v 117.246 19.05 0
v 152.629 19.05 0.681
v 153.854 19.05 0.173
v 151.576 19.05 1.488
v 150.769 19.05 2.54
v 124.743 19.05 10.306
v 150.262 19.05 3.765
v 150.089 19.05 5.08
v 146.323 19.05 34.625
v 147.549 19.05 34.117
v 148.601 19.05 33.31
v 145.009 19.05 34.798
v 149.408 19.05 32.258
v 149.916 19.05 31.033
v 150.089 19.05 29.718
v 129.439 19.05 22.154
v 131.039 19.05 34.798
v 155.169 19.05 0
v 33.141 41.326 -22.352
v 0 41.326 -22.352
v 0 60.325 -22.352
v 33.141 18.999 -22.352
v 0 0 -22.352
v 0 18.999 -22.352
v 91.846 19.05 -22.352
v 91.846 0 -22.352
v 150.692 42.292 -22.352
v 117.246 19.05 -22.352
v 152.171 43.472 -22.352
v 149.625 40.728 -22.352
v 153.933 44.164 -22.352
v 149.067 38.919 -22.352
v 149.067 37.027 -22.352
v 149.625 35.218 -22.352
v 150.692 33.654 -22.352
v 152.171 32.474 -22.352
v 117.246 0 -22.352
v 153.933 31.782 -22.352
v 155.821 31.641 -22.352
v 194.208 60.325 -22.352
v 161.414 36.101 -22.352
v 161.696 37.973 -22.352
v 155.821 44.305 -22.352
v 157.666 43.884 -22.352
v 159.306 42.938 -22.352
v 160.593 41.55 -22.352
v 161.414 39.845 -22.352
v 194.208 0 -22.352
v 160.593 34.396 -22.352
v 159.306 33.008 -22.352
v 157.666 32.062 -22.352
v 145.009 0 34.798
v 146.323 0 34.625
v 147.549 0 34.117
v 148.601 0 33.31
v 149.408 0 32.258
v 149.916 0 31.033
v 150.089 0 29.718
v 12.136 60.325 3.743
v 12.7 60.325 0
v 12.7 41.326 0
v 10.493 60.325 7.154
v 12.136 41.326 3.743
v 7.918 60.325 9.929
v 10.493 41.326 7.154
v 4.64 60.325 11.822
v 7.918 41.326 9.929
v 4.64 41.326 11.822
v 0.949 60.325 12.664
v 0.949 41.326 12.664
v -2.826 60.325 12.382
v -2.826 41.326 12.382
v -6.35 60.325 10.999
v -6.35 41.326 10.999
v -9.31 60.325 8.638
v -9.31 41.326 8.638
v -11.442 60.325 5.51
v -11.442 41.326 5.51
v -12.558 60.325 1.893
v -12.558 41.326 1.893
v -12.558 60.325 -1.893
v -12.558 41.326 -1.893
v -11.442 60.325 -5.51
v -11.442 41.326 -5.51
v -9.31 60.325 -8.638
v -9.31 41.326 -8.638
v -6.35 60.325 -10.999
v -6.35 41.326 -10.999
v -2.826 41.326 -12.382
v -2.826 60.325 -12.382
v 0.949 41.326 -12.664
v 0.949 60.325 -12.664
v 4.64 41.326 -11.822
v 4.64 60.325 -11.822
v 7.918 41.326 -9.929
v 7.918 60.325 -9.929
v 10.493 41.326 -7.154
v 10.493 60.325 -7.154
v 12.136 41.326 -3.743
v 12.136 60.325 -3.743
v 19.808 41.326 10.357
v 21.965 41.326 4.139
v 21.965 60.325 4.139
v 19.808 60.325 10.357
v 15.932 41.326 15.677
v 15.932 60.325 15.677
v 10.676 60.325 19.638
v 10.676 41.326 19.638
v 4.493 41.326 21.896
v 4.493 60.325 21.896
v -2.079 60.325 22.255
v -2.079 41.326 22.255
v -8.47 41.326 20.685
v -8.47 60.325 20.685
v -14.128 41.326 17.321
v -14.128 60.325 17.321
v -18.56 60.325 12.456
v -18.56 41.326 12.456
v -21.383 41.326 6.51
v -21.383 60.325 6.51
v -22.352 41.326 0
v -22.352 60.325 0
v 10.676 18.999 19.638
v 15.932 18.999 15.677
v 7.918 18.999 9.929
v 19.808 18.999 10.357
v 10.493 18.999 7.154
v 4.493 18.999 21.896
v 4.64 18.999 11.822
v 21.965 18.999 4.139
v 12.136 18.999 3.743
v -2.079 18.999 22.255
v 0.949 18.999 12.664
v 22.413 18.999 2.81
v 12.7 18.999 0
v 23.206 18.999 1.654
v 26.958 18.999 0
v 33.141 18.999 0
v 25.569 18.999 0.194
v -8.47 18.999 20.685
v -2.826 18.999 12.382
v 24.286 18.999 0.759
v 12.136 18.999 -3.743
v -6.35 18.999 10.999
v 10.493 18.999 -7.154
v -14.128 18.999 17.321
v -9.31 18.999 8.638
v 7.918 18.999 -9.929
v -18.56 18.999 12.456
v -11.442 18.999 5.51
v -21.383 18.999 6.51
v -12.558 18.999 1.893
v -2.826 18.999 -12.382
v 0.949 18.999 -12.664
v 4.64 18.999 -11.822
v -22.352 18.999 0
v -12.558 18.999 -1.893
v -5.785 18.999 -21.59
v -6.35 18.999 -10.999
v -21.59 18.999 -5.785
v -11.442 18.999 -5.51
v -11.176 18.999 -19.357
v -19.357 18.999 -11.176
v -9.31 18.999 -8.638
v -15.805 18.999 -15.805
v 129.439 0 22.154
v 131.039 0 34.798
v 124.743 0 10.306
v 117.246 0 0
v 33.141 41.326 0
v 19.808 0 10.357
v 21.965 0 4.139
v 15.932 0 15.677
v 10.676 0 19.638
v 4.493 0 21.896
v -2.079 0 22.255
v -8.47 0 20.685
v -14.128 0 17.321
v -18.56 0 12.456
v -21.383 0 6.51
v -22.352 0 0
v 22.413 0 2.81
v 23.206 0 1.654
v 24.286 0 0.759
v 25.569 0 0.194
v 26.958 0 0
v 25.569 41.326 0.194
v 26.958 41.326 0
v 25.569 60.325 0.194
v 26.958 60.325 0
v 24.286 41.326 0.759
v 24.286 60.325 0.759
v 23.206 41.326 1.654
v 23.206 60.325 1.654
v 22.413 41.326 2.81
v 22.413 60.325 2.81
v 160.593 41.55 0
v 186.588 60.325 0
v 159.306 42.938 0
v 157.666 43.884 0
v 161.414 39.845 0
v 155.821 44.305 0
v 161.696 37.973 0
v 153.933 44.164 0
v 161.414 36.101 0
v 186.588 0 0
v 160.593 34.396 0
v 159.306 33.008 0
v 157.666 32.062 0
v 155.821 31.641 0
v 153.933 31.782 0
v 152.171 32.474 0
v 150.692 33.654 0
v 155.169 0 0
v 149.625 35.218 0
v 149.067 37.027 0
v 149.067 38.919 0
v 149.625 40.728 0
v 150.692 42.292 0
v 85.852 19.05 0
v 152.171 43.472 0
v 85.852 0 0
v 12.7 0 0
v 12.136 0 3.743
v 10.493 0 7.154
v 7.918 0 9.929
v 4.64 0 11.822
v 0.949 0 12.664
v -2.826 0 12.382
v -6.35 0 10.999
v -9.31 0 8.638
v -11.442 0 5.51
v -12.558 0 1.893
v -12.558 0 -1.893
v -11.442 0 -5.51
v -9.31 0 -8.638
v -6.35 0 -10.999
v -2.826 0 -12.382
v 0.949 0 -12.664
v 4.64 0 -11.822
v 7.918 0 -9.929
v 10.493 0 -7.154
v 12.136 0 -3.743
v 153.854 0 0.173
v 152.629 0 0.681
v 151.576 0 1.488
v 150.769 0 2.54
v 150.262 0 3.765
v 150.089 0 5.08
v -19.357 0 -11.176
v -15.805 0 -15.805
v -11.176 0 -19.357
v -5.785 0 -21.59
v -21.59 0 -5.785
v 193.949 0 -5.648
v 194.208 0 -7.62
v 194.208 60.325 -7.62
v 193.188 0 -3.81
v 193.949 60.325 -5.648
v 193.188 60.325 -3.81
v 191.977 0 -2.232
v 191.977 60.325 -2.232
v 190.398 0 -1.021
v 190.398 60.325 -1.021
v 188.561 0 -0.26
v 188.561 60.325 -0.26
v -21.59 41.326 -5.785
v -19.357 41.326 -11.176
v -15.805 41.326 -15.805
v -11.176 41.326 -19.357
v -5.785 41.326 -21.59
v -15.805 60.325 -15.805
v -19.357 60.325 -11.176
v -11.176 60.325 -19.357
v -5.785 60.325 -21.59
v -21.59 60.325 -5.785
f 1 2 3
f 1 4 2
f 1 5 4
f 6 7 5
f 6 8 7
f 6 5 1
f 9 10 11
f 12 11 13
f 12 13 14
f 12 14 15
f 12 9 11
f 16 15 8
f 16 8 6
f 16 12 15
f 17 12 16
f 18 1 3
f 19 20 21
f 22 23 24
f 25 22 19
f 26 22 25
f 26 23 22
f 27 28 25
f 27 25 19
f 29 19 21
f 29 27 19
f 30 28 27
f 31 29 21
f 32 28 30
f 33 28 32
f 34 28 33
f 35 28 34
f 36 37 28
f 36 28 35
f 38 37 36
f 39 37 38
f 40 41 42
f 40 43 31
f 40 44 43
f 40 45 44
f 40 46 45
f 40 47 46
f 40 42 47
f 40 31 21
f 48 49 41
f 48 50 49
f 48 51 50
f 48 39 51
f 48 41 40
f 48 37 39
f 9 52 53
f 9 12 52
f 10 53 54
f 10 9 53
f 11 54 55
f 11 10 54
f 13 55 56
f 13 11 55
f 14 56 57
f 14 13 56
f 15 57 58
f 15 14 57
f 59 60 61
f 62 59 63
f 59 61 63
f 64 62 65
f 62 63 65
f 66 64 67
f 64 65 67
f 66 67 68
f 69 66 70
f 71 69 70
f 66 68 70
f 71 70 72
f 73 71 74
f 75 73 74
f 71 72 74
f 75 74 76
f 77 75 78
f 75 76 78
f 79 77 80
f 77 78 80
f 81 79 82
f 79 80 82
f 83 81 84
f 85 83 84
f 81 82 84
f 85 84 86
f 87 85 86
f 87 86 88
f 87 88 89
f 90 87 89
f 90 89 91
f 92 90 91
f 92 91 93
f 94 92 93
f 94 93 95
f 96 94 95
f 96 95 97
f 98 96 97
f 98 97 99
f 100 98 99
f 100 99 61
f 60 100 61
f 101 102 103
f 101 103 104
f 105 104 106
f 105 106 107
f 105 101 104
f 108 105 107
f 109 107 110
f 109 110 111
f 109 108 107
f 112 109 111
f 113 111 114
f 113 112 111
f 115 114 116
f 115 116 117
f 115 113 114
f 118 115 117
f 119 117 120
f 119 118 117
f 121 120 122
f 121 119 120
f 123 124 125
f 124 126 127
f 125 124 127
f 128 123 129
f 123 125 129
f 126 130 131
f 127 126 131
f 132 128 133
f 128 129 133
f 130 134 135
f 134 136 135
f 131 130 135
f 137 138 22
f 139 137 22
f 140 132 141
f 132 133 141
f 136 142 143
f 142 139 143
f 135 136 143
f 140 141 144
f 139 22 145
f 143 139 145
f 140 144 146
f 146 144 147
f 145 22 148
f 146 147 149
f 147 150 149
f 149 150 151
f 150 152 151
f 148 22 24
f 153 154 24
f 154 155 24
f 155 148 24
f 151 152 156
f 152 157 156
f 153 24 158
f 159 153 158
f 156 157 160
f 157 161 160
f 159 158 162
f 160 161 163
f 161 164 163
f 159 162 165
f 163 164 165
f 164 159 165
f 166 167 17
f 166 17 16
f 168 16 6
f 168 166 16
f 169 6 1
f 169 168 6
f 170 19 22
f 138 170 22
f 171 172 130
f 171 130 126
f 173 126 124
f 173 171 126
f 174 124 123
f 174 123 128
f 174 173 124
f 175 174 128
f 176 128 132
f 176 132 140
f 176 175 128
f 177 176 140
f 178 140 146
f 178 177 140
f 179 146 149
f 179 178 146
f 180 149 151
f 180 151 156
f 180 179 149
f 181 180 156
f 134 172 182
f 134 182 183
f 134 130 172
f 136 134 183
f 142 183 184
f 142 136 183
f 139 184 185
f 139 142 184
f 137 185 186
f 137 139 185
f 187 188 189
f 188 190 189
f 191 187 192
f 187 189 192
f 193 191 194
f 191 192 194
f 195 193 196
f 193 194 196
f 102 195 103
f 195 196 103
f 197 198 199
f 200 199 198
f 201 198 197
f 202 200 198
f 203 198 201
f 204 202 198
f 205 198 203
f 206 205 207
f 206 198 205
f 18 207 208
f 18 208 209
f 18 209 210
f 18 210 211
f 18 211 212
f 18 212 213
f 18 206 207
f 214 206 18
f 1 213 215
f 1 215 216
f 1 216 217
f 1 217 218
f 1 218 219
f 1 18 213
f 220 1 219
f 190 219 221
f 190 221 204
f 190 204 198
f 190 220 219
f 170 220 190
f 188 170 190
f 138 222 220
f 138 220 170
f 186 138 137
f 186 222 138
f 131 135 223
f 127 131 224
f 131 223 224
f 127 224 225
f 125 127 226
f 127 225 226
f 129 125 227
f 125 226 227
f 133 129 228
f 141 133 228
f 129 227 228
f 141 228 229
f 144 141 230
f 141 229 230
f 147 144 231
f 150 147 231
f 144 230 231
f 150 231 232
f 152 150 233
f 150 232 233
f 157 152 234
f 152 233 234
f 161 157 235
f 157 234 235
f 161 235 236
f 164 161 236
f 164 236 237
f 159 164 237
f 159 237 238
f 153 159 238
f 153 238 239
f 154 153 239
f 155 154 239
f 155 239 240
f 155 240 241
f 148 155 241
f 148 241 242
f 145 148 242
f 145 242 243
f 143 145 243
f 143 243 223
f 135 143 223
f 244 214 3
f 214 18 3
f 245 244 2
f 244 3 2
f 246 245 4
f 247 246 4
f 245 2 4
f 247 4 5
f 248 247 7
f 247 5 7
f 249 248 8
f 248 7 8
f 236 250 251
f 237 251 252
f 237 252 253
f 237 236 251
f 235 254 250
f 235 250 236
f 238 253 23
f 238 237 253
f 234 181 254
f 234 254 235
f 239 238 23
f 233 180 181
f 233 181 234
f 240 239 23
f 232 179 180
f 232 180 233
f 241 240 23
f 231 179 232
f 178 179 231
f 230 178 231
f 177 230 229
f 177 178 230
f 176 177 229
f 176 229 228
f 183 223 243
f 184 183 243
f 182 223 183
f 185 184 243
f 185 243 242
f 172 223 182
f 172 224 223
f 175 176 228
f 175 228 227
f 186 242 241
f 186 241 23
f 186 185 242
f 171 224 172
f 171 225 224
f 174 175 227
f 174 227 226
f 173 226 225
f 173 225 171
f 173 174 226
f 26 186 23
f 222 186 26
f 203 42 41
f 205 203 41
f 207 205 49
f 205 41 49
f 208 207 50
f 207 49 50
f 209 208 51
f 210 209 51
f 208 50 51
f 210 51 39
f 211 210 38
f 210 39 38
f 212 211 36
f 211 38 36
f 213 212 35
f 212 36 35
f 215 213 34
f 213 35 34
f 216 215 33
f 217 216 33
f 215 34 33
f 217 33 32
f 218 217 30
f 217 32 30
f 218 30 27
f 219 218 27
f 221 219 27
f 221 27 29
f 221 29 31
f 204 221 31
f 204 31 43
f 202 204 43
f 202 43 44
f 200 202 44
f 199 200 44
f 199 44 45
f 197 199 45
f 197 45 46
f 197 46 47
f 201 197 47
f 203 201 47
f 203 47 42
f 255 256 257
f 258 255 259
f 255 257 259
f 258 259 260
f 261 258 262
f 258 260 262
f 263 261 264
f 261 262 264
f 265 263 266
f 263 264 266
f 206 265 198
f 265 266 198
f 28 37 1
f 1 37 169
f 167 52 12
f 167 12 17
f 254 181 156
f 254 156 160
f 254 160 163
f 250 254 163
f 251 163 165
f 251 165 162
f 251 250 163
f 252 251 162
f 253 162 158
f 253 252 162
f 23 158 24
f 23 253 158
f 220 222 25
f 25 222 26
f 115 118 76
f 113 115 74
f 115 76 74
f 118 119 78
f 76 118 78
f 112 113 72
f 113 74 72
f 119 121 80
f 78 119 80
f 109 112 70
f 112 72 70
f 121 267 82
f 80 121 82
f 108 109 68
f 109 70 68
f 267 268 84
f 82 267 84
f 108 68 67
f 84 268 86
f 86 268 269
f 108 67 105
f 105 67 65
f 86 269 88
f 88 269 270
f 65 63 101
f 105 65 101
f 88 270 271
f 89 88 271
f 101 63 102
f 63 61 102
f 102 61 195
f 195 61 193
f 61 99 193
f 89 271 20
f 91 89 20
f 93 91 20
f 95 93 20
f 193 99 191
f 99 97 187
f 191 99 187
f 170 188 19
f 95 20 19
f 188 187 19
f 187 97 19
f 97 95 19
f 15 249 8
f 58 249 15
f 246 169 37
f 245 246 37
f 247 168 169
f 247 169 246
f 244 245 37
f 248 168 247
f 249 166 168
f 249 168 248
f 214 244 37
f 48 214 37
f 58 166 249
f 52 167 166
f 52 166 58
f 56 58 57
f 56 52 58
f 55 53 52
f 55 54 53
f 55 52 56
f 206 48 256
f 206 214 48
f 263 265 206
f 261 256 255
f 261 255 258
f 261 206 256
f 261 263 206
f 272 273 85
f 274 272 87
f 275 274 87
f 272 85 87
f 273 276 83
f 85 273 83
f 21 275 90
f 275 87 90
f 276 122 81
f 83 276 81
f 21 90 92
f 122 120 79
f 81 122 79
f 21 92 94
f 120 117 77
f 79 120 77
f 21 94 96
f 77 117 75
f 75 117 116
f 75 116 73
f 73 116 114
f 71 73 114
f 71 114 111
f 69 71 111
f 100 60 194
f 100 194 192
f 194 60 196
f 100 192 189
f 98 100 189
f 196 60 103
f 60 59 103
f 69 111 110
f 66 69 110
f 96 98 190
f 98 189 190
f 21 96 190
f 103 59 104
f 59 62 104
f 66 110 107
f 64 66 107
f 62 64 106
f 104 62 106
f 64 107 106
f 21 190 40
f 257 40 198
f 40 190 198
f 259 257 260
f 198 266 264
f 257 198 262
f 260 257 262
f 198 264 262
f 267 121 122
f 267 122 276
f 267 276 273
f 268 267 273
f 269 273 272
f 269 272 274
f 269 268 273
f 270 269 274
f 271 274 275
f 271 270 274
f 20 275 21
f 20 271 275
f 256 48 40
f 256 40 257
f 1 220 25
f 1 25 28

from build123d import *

# Parameters (mm, degrees)
F0_R     = 12.7
F0_W     = 44.1198
F0_H     = 22.352
F0_W_2   = 32.8422
F1_DEPTH = 60.325
F2_DEPTH = 19.05
F3_W     = 33.1412
F3_H     = 22.3266
F3_W_2   = 55.289626
F3_R     = 6.35
F4_DEPTH = 57.151
F6_DEPTH = 41.275
F7_R     = 5.08
F8_R     = 7.62


with BuildPart() as f1:
    # F0 (on Front) → F1 (new body)
    with BuildSketch(Plane.XZ):
        with BuildLine():
            ThreePointArc((22.352, 0), (0, 22.352), (-22.352, 0))
            ThreePointArc((-22.352, 0), (-15.805251, -15.805251), (0, -22.352))
            Line((0, -22.352), (91.8464, -22.352))
            Line((91.8464, -22.352), (85.852, 0))
            Line((85.852, 0), (22.352, 0))
        make_face()
        Circle(F0_R, mode=Mode.SUBTRACT)
        Polygon((85.852, 0), (91.8464, -22.352), (117.2464, -22.352), (117.2464, 0), align=None)
        with Locations((172.1485, -11.176)):
            Rectangle(F0_W, F0_H)
        with BuildLine():
            ThreePointArc((131.0386, 34.798), (127.464415, 16.082358), (117.2464, 0))
            Line((117.2464, 0), (150.0886, 0))
            Line((150.0886, 0), (150.0886, 34.798))
            Line((150.0886, 34.798), (131.0386, 34.798))
        make_face()
        with Locations((133.6675, -11.176)):
            Rectangle(F0_W_2, F0_H)
    extrude(amount=-F1_DEPTH)

    # F0 (on Front) → F2 (cut)
    with BuildSketch(Plane.XZ):
        Polygon((85.852, 0), (91.8464, -22.352), (117.2464, -22.352), (117.2464, 0), align=None)
    extrude(amount=-F2_DEPTH, mode=Mode.SUBTRACT)

    # F3 (on face) → F4 (cut, through all)
    with BuildSketch(Plane(origin=(0, 0, -22.352), x_dir=(1, 0, 0), z_dir=(0, 0, -1))):
        with Locations((16.5706, -30.1625)):
            Rectangle(F3_W, F3_H)
        with Locations((-27.644813, -30.1625)):
            Rectangle(F3_W_2, F3_H)
        with Locations((155.3464, -37.973)):
            Circle(F3_R)
    extrude(amount=-F4_DEPTH, mode=Mode.SUBTRACT)

    # F5 (on face) → F6 (cut)
    with BuildSketch(Plane(origin=(0, 60.325, 0), x_dir=(-1, 0, 0), z_dir=(0, 1, 0))):
        with BuildLine():
            Line((-150.0886, 0), (-117.2464, 0))
            ThreePointArc((-117.2464, 0), (-127.464415, 16.082358), (-131.0386, 34.798))
            Line((-131.0386, 34.798), (-150.0886, 34.798))
            Line((-150.0886, 34.798), (-150.0886, 0))
        make_face()
    extrude(amount=-F6_DEPTH, mode=Mode.SUBTRACT)

    # F7
    f7_edges = [f1.edges().sort_by_distance(p)[0] for p in [
        (22.352, 9.4996, 0),
        (22.352, 50.8254, 0),
        (150.0886, 9.525, 34.798),
        (150.0886, 9.525, 0),
    ]]
    fillet(f7_edges, radius=F7_R)

    # F8
    f8_edges = [f1.edges().sort_by_distance(p)[0] for p in [
        (194.2084, 30.1625, 0),
    ]]
    fillet(f8_edges, radius=F8_R)


solid = f1.part
